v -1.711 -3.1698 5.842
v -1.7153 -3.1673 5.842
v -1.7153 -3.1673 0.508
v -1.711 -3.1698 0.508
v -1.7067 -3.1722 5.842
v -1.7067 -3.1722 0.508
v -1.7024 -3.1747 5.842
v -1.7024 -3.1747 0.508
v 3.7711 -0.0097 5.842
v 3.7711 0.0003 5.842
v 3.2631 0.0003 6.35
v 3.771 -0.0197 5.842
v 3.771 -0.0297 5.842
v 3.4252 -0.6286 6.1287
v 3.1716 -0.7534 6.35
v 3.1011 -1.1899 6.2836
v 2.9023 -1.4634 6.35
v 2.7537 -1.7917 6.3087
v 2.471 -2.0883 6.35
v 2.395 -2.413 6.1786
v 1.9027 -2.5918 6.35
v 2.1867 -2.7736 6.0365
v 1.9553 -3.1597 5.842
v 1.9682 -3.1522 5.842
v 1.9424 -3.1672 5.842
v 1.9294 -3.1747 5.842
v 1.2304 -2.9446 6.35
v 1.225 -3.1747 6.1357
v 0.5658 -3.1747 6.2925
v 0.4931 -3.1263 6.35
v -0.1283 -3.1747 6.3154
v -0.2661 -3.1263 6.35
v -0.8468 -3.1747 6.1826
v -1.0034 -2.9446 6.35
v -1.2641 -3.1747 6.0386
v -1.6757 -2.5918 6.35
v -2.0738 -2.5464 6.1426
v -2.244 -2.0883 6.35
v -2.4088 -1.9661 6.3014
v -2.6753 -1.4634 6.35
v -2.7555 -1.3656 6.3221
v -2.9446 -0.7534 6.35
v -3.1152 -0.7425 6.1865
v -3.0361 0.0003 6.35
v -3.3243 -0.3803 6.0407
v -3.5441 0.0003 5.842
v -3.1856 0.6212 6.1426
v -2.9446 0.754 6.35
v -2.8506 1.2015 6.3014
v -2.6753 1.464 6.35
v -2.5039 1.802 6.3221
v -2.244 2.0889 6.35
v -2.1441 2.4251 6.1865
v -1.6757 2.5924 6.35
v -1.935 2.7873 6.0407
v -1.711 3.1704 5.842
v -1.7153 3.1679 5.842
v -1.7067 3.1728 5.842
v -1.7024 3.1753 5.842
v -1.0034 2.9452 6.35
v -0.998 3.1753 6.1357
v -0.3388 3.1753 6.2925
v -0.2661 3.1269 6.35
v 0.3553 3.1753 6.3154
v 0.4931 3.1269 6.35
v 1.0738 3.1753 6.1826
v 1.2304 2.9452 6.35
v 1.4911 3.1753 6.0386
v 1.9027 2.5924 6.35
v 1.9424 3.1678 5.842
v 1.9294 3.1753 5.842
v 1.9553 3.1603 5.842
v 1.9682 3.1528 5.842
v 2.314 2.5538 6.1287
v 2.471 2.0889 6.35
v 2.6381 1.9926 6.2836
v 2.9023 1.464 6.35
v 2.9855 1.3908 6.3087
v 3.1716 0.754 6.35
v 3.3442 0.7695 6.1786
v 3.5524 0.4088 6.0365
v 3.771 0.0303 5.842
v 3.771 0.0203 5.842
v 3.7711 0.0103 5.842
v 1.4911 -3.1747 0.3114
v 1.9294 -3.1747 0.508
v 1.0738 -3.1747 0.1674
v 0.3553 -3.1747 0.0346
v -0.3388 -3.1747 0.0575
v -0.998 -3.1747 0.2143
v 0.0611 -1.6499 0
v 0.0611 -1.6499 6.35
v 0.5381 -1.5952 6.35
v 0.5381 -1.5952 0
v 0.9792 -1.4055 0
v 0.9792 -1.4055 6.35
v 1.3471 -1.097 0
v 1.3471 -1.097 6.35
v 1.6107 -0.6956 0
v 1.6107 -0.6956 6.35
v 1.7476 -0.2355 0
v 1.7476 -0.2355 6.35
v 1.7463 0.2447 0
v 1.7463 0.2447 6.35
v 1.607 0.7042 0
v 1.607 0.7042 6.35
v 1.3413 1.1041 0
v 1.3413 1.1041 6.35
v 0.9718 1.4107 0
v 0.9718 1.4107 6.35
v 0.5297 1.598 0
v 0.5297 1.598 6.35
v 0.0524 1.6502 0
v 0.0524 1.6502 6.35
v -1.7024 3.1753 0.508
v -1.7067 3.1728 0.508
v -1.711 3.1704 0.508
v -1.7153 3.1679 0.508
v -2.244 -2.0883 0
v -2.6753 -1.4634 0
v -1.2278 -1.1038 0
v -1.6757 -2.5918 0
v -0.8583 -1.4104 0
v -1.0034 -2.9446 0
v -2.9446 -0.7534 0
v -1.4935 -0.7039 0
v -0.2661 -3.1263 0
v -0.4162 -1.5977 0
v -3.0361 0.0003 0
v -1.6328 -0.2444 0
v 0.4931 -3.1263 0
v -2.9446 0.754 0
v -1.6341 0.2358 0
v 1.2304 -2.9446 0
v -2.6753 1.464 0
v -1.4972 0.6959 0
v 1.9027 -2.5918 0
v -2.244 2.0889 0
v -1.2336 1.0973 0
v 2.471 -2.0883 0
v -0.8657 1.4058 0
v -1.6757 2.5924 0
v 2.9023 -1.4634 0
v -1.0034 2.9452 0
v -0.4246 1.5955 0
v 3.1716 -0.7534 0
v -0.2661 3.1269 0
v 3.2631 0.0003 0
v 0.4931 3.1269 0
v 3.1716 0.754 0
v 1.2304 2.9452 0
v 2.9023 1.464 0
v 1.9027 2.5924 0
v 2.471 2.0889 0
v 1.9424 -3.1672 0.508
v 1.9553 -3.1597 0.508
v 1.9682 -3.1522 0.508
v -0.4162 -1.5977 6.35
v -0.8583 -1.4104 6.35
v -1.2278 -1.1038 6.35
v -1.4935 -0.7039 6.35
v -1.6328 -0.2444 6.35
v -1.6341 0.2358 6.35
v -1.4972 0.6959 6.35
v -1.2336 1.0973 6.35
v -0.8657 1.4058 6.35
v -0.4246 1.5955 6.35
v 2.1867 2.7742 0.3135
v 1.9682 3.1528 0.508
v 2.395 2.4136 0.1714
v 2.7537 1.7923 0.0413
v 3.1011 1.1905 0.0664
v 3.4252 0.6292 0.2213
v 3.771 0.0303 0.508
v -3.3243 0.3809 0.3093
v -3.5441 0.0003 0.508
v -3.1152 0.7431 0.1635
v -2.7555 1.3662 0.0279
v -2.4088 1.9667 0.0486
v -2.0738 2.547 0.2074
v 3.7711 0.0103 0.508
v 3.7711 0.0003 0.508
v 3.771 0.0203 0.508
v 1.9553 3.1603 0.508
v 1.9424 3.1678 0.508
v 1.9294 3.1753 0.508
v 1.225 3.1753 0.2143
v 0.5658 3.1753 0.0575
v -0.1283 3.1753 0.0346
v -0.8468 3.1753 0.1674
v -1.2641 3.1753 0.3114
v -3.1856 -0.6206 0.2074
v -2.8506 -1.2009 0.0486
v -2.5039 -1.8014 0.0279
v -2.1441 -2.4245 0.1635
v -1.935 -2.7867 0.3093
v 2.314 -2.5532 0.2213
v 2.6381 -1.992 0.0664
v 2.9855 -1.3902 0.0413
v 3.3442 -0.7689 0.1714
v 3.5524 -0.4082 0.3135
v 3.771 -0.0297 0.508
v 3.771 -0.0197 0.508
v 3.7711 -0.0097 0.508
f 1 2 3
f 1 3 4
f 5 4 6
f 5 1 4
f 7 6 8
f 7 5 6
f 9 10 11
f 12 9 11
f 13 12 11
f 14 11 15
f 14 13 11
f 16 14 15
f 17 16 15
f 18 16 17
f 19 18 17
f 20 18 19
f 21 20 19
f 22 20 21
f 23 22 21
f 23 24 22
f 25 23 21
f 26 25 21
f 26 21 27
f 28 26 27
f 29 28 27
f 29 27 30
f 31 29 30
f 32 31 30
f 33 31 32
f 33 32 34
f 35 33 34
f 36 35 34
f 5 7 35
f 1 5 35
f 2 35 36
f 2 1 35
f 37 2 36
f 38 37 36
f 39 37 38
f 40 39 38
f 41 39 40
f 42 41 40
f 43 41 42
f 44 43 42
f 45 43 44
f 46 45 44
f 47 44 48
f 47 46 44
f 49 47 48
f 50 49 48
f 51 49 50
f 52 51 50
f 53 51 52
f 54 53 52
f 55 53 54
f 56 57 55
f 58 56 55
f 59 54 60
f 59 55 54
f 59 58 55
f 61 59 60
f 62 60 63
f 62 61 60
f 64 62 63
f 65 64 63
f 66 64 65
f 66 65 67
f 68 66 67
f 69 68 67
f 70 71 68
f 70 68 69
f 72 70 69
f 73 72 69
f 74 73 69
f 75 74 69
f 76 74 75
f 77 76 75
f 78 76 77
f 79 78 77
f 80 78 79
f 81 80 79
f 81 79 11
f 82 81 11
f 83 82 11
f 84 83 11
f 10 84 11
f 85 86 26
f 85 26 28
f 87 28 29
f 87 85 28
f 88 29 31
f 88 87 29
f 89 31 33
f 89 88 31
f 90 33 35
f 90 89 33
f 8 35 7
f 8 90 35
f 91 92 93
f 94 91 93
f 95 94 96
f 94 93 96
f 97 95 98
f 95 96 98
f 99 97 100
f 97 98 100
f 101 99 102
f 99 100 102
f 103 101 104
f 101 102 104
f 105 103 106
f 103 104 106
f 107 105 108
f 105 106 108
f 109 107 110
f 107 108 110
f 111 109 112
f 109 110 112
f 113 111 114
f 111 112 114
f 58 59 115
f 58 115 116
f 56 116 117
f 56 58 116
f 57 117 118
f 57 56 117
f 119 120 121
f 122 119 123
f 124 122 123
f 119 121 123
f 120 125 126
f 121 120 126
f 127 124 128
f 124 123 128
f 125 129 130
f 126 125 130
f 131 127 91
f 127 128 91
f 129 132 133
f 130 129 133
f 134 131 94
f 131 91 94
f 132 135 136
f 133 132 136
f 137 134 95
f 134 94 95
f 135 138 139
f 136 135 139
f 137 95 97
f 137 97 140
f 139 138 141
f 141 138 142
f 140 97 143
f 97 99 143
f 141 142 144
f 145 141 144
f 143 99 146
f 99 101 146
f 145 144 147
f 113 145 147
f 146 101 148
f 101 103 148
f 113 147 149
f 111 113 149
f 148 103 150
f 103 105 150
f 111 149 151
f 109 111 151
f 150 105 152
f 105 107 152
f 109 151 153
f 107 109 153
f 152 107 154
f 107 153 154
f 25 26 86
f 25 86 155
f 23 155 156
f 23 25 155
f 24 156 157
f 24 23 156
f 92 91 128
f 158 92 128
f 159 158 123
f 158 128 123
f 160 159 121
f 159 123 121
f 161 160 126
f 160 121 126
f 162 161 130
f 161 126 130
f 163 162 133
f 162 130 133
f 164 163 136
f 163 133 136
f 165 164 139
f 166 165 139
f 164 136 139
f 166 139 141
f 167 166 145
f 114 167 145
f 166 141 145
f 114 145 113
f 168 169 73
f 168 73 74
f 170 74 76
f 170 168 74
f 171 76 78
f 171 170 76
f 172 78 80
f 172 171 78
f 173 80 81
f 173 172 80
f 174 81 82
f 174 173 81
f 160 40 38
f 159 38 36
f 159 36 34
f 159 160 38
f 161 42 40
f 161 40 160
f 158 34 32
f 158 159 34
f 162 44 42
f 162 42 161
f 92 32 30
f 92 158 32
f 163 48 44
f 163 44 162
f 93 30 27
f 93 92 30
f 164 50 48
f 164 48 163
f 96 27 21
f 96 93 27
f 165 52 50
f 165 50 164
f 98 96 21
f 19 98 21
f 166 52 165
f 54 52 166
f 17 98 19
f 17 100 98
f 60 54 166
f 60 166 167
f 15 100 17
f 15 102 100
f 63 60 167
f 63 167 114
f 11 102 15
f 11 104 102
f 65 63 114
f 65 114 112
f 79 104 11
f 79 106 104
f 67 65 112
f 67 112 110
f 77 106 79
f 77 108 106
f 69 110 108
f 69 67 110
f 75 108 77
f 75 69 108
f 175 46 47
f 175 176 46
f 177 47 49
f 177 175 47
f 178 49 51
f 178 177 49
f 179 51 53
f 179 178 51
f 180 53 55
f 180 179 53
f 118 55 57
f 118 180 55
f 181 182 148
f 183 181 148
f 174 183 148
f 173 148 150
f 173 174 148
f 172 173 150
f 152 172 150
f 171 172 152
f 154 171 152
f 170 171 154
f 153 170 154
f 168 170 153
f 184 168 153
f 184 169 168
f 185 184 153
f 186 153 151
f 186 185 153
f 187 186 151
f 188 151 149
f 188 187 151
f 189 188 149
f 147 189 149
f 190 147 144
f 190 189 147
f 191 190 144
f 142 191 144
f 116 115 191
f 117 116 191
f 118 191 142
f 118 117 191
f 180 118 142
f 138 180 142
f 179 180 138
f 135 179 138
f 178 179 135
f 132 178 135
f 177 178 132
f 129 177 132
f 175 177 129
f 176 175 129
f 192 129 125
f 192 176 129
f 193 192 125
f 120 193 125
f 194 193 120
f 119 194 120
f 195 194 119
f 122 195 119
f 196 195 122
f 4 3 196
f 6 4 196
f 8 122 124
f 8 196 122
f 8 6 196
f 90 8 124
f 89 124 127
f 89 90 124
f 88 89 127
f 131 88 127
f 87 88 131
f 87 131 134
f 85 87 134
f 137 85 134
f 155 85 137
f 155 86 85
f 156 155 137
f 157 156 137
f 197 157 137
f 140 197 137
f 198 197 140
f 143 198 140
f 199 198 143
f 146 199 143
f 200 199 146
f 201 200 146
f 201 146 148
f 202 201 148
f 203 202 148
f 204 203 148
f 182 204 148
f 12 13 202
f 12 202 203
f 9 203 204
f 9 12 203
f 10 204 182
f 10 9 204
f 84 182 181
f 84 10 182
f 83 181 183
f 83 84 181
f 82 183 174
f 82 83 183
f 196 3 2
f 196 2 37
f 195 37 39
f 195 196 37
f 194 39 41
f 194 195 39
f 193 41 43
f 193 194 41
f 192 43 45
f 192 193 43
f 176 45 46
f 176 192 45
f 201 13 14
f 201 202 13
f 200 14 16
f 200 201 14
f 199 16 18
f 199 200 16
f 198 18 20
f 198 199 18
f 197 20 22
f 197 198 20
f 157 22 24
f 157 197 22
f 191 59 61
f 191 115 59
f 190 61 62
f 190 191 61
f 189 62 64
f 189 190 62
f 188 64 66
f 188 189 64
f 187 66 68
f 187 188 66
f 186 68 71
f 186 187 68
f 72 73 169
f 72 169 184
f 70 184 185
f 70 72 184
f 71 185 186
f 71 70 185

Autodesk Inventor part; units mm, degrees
ref_plane "YZ Plane" through (0, 0, 0) normal (1, 0, 0) x (0, 1, 0)
sketch "Sketch1" plane through (0, 0, 0) normal (0, 0, 1) x (1, 0, 0)
  line L0 (1.9552, -3.1747) -> (-1.711, -3.1747)
  line L1 (-1.711, -3.1747) -> (-3.5441, 0.0003)
  line L2 (-3.5441, 0.0003) -> (-1.711, 3.1753)
  line L3 (-1.711, 3.1753) -> (1.9552, 3.1753)
  line L4 (1.9552, 3.1753) -> (3.7883, 0.0003)
  line L5 (3.7883, 0.0003) -> (1.9552, -3.1747)
  point P0 (0.1221, 0.0003)
  dimension "d0" = 6.35
extrude "Extrusion1" add sketch "Sketch1" along normal blind 6.35
ref_plane "Work Plane1" through (-1.711, 0.0003, 0) normal (0, 1, 0) x (1, 0, 0)
sketch "Sketch3" plane through (-1.711, 0.0003, 0) normal (0, 1, 0) x (1, 0, 0)
  line L0 (-1.3251, 0) -> (4.9741, 0)
  line L1 (5.4821, -0.508) -> (5.4821, -5.842)
  line L2 (-1.8331, -5.842) -> (-1.8331, -0.508)
  line L3 (-1.8331, -0.508) -> (-1.3251, 0)
  line L4 (4.9741, 0) -> (5.4821, -0.508)
  line L5 (-1.8331, 0) -> (-1.8331, -6.35) projected
  line L6 (3.6662, 0) -> (5.4993, 0) projected
  line L7 (1.8245, 0) -> (1.8245, -6.35)
  line L8 (0, -6.35) -> (-1.8331, -6.35) projected
  line L9 (5.4993, -6.35) -> (3.6662, -6.35) projected
  line L10 (3.6662, -6.35) -> (0, -6.35) projected
  line L11 (-1.3251, -6.35) -> (-1.8331, -5.842)
  line L12 (4.9741, -6.35) -> (5.4821, -5.842)
  point P0 (-1.8331, 0)
  point P1 (5.4821, 0)
  point P2 (5.4821, -6.35)
  dimension "d5" = 0.508
  dimension "d6" = 0.508
  dimension "d7" = 0.508
  dimension "d8" = 0.508
  dimension "d16" = 0
  dimension "d46" = 0.508
  dimension "d47" = 0.508
  dimension "d48" = 0.508
  dimension "d49" = 0.508
revolve "Revolution1" cut sketch "Sketch3" angle 360 about axis through (0.1135, 0.0003, 0) along (0, 0, 1) keep common part contours L0 L4 L1 L12 L9 L10 L7
sketch "Sketch6" plane through (0.1135, 0.0003, 0) normal (0, 0, -1) x (-1, 0, 0)
  circle A0 centre (0, 0) radius 3.1496 projected
hole "Hole3" at (0.1135, 0.0003, 0) direction (0, 0, 1) diameter 3.302 depth 6.35 tip angle 118 thread size "8-32 UNC" class "2B" standard "ANSI Unified Screw Threads"
sketch "Sketch7" plane through (0, 0, 6.35) normal (0, 0, 1) x (1, 0, 0)
  point P0 (0, 0)
hole "Hole4" at (0, 0, 6.35) direction (0, 0, -1) diameter 3.302 depth 6.35 tip angle 118 thread size "8-32 UNC" class "2B" standard "ANSI Unified Screw Threads"
ref_plane "Work Plane2" through (0.1135, 0.0003, 3.175) normal (0, 0, -1) x (-1, 0, 0)
equation "\"d6\" = d5"
equation "\"d7\" = d5"
equation "\"d8\" = d7"
properties part number "0.25 inch Standoff" material "Steel"
